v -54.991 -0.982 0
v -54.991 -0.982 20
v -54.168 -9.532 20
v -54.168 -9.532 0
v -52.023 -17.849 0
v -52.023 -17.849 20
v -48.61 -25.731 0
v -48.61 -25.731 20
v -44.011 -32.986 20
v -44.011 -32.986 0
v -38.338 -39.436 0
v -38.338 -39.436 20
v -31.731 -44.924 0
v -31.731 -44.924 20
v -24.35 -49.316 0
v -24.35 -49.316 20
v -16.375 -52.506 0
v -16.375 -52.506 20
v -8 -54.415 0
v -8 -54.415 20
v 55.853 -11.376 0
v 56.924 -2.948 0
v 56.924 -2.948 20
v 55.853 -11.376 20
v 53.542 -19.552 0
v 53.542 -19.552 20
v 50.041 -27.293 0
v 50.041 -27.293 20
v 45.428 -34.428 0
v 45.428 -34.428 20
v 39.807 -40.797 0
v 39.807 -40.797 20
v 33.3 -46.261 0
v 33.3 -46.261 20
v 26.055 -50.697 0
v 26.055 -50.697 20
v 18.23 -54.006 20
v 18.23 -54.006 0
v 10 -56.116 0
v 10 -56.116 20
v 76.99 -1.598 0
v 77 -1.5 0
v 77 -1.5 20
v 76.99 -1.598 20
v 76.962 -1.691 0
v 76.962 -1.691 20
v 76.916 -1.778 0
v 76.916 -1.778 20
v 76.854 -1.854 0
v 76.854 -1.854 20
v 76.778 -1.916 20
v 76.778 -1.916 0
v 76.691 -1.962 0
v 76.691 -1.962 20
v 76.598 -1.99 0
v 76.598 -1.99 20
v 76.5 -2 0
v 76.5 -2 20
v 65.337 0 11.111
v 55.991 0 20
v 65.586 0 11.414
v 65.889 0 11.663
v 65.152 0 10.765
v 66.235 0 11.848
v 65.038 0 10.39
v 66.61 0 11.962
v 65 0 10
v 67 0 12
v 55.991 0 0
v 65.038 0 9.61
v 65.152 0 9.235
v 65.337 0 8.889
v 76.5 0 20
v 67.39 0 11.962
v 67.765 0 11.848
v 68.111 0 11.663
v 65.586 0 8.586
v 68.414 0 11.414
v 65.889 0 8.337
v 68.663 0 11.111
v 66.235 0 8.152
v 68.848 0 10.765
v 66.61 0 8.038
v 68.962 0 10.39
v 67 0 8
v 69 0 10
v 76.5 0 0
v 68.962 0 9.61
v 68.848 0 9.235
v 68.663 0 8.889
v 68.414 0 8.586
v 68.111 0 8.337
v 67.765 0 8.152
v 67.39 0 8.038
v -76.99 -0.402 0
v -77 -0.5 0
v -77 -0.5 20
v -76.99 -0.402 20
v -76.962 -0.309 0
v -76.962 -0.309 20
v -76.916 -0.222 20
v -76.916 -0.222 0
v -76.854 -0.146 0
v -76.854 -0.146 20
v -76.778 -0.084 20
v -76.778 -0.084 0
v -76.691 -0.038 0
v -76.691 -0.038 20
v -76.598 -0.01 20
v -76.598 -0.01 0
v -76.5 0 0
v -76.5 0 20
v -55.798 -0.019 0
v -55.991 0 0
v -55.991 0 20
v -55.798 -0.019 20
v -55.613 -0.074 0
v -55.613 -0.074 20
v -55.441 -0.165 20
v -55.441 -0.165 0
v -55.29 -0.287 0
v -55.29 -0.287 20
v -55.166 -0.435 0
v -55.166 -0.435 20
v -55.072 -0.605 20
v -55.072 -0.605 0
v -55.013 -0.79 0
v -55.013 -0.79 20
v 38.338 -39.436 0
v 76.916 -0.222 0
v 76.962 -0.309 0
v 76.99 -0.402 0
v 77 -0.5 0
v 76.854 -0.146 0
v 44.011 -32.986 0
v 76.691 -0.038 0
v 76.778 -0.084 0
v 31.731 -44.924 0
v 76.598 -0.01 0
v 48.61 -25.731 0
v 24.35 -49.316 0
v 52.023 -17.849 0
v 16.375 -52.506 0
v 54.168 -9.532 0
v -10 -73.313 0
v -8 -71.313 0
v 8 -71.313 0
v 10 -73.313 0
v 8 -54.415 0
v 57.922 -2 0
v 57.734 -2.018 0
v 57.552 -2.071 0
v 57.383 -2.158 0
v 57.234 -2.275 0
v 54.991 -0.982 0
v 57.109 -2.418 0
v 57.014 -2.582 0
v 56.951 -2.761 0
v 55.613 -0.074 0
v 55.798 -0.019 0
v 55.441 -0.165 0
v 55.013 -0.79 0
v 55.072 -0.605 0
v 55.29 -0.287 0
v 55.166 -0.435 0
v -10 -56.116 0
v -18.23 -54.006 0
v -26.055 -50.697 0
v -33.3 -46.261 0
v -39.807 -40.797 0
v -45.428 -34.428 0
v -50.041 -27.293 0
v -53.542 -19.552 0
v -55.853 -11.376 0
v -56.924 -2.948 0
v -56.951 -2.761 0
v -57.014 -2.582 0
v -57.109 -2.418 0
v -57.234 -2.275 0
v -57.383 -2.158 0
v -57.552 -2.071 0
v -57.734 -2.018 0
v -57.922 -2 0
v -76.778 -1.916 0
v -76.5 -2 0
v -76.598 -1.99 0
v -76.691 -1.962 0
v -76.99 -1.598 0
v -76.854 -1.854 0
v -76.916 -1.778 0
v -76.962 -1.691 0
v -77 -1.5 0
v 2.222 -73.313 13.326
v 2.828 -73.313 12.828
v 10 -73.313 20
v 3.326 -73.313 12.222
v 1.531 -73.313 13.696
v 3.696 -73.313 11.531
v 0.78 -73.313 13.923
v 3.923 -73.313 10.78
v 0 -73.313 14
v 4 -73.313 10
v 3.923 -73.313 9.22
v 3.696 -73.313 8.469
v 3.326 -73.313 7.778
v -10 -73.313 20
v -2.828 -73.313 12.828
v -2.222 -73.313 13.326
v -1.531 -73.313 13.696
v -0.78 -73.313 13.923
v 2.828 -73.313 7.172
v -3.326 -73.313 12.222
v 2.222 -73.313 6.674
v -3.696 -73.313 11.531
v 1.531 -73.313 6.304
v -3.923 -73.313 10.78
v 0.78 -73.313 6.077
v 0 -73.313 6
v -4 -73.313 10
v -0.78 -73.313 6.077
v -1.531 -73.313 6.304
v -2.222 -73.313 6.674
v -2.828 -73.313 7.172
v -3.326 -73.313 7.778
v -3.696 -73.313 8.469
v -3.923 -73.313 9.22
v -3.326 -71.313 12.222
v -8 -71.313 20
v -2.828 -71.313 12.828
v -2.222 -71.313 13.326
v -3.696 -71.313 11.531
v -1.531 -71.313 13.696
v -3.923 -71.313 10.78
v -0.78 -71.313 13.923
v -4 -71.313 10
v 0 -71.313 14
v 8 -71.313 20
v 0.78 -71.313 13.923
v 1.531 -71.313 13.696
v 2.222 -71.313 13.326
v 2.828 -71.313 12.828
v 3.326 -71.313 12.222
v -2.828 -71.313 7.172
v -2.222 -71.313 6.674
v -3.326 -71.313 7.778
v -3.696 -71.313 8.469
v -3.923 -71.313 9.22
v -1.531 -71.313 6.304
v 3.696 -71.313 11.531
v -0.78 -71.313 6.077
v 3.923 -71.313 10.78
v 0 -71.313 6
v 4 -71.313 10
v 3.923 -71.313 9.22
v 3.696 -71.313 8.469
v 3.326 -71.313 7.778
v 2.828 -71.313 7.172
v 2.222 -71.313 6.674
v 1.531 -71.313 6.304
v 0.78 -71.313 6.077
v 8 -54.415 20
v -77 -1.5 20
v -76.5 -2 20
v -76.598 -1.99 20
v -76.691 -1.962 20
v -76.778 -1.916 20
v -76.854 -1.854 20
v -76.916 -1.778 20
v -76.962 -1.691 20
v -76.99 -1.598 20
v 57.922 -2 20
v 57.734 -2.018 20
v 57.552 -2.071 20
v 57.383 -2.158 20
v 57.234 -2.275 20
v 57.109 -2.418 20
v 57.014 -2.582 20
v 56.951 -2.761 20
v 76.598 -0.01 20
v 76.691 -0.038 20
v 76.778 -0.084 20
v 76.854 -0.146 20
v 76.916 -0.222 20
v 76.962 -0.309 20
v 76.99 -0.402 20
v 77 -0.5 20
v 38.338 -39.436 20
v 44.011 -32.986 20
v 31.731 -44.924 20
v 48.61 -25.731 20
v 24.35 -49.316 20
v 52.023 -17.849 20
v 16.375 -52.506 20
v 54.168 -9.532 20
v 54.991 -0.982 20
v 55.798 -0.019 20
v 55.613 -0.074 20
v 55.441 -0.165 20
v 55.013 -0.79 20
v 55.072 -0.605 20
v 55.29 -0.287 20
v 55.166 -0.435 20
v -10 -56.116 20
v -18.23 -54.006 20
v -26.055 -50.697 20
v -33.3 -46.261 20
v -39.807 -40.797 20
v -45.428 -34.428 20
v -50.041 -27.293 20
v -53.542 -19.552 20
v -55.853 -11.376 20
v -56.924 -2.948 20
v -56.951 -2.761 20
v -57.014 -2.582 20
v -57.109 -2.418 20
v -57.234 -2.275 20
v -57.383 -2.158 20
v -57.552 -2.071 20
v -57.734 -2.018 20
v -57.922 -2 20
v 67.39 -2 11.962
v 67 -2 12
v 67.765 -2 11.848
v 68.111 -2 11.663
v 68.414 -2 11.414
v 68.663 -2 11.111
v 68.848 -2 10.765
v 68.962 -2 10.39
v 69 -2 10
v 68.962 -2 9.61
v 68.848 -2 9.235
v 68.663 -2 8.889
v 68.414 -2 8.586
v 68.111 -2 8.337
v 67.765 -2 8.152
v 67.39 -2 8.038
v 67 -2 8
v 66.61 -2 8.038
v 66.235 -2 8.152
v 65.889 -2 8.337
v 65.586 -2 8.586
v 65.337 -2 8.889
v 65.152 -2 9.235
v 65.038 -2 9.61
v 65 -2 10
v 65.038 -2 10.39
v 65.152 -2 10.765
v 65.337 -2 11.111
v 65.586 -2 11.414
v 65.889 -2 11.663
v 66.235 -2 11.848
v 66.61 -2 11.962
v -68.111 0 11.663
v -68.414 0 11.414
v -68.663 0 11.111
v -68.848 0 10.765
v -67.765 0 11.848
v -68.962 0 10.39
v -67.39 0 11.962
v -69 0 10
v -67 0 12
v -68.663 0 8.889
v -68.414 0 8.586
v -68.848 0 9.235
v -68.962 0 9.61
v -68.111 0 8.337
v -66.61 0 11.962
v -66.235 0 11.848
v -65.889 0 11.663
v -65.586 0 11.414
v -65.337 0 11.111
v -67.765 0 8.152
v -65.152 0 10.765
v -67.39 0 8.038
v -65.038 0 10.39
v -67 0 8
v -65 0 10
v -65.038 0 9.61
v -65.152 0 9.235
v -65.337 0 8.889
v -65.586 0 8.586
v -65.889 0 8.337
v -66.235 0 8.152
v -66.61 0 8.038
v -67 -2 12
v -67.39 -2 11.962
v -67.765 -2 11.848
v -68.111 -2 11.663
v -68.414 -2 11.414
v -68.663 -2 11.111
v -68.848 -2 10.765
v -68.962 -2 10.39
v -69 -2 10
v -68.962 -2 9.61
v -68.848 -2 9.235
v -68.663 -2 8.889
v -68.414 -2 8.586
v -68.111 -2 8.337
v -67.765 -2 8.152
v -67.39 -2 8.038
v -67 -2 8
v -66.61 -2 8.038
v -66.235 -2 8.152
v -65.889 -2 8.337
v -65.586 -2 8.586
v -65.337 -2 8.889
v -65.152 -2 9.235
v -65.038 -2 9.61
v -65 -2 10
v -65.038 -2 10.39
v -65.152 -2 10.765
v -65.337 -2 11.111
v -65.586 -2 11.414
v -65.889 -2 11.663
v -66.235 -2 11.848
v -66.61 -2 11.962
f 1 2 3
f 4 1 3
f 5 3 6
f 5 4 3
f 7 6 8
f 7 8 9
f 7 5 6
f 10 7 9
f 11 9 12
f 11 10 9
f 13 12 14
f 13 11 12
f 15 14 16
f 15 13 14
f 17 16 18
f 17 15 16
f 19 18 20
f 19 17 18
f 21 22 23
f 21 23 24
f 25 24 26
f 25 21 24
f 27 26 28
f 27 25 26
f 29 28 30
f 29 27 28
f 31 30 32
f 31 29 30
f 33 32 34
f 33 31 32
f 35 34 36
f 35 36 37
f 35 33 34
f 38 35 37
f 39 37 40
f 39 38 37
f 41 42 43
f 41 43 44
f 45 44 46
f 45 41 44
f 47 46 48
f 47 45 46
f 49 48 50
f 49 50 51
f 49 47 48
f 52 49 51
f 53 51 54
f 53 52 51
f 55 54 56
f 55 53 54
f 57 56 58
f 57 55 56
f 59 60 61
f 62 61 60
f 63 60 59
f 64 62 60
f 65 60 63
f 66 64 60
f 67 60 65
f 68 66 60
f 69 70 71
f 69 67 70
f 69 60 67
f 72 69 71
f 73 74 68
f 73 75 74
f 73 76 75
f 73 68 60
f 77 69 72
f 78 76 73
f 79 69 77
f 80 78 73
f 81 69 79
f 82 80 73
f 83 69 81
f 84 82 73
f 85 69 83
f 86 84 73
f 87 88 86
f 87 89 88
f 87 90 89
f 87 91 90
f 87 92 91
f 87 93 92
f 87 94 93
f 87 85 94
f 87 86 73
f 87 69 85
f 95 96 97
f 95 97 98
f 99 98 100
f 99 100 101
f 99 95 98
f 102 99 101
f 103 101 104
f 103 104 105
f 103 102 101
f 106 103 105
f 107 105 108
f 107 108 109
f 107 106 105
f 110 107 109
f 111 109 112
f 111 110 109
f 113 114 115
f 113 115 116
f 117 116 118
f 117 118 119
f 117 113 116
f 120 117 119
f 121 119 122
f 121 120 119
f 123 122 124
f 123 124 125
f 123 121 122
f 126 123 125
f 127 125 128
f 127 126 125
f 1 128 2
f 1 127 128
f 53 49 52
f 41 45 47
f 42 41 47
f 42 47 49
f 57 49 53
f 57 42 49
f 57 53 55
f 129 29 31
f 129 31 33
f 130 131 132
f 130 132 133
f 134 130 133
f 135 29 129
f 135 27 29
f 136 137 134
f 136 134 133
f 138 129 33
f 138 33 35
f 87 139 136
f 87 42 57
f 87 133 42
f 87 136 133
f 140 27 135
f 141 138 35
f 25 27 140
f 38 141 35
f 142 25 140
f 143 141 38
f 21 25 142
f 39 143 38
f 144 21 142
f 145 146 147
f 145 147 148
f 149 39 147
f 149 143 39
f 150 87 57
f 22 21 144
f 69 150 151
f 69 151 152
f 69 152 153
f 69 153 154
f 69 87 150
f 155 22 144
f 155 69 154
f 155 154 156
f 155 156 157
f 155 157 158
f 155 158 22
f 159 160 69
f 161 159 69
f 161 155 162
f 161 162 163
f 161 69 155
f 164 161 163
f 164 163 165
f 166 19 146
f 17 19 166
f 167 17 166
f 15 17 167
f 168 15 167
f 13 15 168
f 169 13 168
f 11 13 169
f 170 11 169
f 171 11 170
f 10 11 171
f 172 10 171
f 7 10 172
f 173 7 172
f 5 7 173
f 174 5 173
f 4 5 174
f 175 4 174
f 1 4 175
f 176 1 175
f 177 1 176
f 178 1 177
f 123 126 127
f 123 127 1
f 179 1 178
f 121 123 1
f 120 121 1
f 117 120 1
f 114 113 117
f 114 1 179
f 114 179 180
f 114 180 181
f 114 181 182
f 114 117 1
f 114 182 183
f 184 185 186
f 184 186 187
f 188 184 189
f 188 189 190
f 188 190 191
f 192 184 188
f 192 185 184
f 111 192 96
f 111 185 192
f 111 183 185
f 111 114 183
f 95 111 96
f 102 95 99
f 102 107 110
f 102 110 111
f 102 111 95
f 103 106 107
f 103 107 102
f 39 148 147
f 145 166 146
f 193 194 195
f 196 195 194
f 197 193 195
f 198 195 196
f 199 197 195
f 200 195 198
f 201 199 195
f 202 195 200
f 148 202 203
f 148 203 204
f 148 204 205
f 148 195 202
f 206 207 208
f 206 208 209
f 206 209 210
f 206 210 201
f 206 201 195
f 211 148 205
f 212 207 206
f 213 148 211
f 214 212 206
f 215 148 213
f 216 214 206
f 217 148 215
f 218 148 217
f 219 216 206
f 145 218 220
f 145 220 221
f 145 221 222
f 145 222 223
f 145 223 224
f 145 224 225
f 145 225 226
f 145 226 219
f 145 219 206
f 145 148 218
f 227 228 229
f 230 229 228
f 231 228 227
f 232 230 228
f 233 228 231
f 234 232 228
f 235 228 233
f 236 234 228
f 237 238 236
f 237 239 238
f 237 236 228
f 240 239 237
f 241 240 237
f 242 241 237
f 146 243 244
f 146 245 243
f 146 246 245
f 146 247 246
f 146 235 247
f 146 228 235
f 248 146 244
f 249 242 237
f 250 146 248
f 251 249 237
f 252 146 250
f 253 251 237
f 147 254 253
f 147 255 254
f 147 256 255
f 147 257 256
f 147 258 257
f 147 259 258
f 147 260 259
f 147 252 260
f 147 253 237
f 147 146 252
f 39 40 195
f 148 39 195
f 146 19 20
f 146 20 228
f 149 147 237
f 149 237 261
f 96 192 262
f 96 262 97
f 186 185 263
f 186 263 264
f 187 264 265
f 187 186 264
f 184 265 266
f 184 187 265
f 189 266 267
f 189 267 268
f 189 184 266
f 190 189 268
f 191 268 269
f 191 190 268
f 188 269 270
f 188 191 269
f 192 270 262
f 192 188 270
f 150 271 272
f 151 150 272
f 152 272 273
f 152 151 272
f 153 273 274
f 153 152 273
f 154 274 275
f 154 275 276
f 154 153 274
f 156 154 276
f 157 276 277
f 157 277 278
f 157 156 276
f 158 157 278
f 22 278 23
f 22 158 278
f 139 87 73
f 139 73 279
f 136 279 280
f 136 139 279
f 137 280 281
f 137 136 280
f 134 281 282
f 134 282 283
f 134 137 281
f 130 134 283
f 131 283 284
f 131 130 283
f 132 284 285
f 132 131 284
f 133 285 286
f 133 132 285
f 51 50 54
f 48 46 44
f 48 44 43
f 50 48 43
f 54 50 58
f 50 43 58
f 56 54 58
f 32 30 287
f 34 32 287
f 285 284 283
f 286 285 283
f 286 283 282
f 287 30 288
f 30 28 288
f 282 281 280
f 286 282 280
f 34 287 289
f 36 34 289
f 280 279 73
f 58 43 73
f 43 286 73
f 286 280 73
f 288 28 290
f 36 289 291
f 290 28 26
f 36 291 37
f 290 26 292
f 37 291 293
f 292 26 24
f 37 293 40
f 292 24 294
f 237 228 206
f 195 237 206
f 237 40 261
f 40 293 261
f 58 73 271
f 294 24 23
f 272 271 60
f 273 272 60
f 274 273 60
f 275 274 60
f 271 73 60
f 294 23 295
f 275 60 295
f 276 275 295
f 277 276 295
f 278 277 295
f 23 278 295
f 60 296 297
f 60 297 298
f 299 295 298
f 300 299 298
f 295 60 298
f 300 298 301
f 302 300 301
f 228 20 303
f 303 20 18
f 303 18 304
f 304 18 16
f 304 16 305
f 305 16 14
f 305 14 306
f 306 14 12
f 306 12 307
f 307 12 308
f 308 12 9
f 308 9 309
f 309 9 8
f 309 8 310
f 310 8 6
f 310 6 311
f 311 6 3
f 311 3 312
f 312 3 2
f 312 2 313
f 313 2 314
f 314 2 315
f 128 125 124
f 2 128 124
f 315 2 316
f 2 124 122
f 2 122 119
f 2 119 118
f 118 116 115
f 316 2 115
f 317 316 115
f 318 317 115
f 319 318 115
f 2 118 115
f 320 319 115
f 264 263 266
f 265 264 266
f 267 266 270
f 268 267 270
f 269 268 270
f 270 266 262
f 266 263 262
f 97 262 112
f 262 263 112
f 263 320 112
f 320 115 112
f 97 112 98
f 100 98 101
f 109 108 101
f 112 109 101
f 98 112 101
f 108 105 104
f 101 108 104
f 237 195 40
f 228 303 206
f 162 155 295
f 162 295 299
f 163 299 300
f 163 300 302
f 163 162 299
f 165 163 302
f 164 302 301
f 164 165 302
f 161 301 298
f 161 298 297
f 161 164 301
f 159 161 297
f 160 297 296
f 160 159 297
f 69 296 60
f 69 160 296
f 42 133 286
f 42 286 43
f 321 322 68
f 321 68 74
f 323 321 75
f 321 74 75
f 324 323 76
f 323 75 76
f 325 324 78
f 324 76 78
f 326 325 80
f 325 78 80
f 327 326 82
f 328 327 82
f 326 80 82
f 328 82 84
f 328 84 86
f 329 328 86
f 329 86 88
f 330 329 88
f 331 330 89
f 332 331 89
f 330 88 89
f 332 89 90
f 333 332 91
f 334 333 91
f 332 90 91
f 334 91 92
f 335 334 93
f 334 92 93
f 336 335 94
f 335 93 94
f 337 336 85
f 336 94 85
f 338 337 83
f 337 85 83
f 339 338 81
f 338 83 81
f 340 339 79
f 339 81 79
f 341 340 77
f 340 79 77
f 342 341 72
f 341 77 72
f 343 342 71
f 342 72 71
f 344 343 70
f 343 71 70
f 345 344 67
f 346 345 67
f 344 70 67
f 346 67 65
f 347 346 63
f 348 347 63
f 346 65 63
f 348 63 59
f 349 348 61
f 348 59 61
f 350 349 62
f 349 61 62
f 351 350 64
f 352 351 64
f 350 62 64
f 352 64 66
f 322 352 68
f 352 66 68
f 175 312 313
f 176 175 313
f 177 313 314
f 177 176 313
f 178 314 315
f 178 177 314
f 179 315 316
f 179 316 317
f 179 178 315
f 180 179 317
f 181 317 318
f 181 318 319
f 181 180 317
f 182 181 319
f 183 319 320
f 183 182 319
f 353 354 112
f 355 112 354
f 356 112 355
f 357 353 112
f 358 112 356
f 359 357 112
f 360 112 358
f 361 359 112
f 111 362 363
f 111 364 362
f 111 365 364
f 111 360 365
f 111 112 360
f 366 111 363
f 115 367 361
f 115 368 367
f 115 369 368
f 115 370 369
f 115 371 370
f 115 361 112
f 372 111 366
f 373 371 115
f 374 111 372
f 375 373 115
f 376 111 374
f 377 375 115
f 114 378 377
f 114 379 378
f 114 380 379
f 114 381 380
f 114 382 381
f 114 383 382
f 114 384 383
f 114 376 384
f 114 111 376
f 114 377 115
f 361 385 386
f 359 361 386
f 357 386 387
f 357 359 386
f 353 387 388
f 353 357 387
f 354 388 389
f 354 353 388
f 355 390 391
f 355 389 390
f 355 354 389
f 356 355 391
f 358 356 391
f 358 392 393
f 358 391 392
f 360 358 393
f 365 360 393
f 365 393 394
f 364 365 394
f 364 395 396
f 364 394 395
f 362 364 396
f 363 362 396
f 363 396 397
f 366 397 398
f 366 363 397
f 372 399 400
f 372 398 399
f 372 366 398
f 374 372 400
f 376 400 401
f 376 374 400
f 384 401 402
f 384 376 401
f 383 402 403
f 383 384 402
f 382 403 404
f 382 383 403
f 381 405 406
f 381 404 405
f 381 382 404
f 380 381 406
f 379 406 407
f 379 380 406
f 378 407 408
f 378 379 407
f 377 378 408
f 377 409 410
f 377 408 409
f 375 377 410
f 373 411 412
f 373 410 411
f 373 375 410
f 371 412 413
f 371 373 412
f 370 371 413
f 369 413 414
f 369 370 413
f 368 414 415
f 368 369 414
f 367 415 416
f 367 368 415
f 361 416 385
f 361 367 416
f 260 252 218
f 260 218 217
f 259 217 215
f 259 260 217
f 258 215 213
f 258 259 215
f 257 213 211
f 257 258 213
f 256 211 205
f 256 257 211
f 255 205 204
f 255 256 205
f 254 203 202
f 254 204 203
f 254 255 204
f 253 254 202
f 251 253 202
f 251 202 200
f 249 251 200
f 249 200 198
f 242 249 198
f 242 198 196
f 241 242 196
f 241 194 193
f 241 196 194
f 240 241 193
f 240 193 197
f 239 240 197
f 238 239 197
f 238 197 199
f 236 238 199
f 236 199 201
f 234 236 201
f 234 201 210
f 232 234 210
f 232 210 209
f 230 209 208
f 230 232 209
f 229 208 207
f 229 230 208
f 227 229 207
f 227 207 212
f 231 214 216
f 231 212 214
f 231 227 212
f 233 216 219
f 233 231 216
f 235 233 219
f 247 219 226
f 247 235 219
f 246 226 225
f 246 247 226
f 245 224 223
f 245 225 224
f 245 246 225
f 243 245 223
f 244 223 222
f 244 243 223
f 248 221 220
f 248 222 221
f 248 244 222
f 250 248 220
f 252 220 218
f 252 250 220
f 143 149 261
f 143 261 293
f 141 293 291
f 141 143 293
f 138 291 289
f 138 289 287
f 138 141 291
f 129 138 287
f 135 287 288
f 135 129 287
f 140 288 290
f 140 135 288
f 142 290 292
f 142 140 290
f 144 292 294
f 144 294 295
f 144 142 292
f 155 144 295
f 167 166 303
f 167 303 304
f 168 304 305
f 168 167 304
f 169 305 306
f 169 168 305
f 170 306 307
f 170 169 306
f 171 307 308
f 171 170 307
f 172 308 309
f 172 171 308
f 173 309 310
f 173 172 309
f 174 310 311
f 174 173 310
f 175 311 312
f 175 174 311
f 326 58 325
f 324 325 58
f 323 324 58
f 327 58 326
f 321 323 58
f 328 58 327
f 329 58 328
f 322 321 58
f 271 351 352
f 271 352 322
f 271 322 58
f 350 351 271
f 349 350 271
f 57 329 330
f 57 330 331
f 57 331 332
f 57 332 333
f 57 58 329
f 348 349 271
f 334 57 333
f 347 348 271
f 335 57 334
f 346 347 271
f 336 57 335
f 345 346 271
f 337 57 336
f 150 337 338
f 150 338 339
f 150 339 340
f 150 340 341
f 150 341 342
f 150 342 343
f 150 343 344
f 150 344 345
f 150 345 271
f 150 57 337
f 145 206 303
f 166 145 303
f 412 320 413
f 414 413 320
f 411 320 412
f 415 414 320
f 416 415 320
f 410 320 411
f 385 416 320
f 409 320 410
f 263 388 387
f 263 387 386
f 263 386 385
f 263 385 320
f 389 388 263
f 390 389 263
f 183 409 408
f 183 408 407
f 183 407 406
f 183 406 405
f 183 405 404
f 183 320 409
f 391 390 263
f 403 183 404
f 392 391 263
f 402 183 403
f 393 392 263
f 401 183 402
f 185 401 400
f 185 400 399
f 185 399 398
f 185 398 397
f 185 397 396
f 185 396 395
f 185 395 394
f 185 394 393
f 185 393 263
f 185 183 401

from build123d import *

# Parameters (mm, degrees)
SALIENTE_EXTRUIR2_DEPTH    = 20
CORTAR_EXTRUIR1_DEPTH      = 109.18398602
CORTAR_EXTRUIR1_DEPTH_BACK = 109.18398602
CROQUIS3_R                 = 4
CROQUIS4_R                 = 2
CORTAR_EXTRUIR2_DEPTH      = 109.18398602


with BuildPart() as part:
    # Croquis1 → Saliente-Extruir2 (new body)
    with BuildSketch(Plane.XY):
        with BuildLine():
            Line((-57, 0), (-55.991070717, 0))
            ThreePointArc((-55.991070717, 0), (-55.290305828, -0.286607702), (-54.991230168, -0.982142857))
            ThreePointArc((-54.991230168, -0.982142857), (-41.300644472, -36.32157439), (-8, -54.415071442))
            Line((-8, -54.415071442), (-8, -56.435804238))
            Line((-8, -56.435804238), (-8, -71.312855839))
            Line((-8, -71.312855839), (8, -71.312855839))
            Line((8, -71.312855839), (8, -56.435804238))
            Line((8, -56.435804238), (8, -54.415071442))
            ThreePointArc((8, -54.415071442), (41.300644472, -36.32157439), (54.991230168, -0.982142857))
            ThreePointArc((54.991230168, -0.982142857), (55.290305828, -0.286607702), (55.991070717, 0))
            Line((55.991070717, 0), (57, 0))
            Line((57, 0), (76.5, 0))
            ThreePointArc((76.5, 0), (76.853553391, -0.146446609), (77, -0.5))
            Line((77, -0.5), (77, -1.5))
            ThreePointArc((77, -1.5), (76.853553391, -1.853553391), (76.5, -2))
            Line((76.5, -2), (57.92236183, -2))
            ThreePointArc((57.92236183, -2), (57.233785087, -2.274836523), (56.923700419, -2.948275862))
            ThreePointArc((56.923700419, -2.948275862), (42.736352788, -37.717425023), (10, -56.115951386))
            Line((10, -56.115951386), (10, -73.312855839))
            Line((10, -73.312855839), (-10, -73.312855839))
            Line((-10, -73.312855839), (-10, -56.115951386))
            ThreePointArc((-10, -56.115951386), (-42.736352788, -37.717425023), (-56.923700419, -2.948275862))
            ThreePointArc((-56.923700419, -2.948275862), (-57.233785087, -2.274836523), (-57.92236183, -2))
            Line((-57.92236183, -2), (-76.5, -2))
            ThreePointArc((-76.5, -2), (-76.853553391, -1.853553391), (-77, -1.5))
            Line((-77, -1.5), (-77, -0.5))
            ThreePointArc((-77, -0.5), (-76.853553391, -0.146446609), (-76.5, 0))
            Line((-76.5, 0), (-57, 0))
        make_face()
    extrude(amount=SALIENTE_EXTRUIR2_DEPTH)

    # Croquis3 → Cortar-Extruir1 (cut, two sides: drawn at the far end of the back side and taken through both)
    with BuildSketch(Plane.XZ.offset(73.312855839).offset(-CORTAR_EXTRUIR1_DEPTH_BACK)):
        with Locations(Location((0, 10, 0), (0, 0, 270))):
            Circle(CROQUIS3_R)
    extrude(amount=CORTAR_EXTRUIR1_DEPTH + CORTAR_EXTRUIR1_DEPTH_BACK, mode=Mode.SUBTRACT)

    # Croquis4 → Cortar-Extruir2 (cut, symmetric)
    with BuildSketch(Plane(origin=(0, 0, 0), x_dir=(1, 0, 0), z_dir=(0, 1, 0))):
        with Locations(Location((67, -10, 0), (0, 0, 270))):
            Circle(CROQUIS4_R)
    cortar_extruir2 = extrude(amount=CORTAR_EXTRUIR2_DEPTH, both=True, mode=Mode.SUBTRACT)

    # Simetría1: Cortar-Extruir2 across plane
    add(cortar_extruir2.mirror(Plane(origin=(0, 0, 0), x_dir=(0, 0, 1), z_dir=(1, 0, 0))), mode=Mode.SUBTRACT)


solid = part.part
